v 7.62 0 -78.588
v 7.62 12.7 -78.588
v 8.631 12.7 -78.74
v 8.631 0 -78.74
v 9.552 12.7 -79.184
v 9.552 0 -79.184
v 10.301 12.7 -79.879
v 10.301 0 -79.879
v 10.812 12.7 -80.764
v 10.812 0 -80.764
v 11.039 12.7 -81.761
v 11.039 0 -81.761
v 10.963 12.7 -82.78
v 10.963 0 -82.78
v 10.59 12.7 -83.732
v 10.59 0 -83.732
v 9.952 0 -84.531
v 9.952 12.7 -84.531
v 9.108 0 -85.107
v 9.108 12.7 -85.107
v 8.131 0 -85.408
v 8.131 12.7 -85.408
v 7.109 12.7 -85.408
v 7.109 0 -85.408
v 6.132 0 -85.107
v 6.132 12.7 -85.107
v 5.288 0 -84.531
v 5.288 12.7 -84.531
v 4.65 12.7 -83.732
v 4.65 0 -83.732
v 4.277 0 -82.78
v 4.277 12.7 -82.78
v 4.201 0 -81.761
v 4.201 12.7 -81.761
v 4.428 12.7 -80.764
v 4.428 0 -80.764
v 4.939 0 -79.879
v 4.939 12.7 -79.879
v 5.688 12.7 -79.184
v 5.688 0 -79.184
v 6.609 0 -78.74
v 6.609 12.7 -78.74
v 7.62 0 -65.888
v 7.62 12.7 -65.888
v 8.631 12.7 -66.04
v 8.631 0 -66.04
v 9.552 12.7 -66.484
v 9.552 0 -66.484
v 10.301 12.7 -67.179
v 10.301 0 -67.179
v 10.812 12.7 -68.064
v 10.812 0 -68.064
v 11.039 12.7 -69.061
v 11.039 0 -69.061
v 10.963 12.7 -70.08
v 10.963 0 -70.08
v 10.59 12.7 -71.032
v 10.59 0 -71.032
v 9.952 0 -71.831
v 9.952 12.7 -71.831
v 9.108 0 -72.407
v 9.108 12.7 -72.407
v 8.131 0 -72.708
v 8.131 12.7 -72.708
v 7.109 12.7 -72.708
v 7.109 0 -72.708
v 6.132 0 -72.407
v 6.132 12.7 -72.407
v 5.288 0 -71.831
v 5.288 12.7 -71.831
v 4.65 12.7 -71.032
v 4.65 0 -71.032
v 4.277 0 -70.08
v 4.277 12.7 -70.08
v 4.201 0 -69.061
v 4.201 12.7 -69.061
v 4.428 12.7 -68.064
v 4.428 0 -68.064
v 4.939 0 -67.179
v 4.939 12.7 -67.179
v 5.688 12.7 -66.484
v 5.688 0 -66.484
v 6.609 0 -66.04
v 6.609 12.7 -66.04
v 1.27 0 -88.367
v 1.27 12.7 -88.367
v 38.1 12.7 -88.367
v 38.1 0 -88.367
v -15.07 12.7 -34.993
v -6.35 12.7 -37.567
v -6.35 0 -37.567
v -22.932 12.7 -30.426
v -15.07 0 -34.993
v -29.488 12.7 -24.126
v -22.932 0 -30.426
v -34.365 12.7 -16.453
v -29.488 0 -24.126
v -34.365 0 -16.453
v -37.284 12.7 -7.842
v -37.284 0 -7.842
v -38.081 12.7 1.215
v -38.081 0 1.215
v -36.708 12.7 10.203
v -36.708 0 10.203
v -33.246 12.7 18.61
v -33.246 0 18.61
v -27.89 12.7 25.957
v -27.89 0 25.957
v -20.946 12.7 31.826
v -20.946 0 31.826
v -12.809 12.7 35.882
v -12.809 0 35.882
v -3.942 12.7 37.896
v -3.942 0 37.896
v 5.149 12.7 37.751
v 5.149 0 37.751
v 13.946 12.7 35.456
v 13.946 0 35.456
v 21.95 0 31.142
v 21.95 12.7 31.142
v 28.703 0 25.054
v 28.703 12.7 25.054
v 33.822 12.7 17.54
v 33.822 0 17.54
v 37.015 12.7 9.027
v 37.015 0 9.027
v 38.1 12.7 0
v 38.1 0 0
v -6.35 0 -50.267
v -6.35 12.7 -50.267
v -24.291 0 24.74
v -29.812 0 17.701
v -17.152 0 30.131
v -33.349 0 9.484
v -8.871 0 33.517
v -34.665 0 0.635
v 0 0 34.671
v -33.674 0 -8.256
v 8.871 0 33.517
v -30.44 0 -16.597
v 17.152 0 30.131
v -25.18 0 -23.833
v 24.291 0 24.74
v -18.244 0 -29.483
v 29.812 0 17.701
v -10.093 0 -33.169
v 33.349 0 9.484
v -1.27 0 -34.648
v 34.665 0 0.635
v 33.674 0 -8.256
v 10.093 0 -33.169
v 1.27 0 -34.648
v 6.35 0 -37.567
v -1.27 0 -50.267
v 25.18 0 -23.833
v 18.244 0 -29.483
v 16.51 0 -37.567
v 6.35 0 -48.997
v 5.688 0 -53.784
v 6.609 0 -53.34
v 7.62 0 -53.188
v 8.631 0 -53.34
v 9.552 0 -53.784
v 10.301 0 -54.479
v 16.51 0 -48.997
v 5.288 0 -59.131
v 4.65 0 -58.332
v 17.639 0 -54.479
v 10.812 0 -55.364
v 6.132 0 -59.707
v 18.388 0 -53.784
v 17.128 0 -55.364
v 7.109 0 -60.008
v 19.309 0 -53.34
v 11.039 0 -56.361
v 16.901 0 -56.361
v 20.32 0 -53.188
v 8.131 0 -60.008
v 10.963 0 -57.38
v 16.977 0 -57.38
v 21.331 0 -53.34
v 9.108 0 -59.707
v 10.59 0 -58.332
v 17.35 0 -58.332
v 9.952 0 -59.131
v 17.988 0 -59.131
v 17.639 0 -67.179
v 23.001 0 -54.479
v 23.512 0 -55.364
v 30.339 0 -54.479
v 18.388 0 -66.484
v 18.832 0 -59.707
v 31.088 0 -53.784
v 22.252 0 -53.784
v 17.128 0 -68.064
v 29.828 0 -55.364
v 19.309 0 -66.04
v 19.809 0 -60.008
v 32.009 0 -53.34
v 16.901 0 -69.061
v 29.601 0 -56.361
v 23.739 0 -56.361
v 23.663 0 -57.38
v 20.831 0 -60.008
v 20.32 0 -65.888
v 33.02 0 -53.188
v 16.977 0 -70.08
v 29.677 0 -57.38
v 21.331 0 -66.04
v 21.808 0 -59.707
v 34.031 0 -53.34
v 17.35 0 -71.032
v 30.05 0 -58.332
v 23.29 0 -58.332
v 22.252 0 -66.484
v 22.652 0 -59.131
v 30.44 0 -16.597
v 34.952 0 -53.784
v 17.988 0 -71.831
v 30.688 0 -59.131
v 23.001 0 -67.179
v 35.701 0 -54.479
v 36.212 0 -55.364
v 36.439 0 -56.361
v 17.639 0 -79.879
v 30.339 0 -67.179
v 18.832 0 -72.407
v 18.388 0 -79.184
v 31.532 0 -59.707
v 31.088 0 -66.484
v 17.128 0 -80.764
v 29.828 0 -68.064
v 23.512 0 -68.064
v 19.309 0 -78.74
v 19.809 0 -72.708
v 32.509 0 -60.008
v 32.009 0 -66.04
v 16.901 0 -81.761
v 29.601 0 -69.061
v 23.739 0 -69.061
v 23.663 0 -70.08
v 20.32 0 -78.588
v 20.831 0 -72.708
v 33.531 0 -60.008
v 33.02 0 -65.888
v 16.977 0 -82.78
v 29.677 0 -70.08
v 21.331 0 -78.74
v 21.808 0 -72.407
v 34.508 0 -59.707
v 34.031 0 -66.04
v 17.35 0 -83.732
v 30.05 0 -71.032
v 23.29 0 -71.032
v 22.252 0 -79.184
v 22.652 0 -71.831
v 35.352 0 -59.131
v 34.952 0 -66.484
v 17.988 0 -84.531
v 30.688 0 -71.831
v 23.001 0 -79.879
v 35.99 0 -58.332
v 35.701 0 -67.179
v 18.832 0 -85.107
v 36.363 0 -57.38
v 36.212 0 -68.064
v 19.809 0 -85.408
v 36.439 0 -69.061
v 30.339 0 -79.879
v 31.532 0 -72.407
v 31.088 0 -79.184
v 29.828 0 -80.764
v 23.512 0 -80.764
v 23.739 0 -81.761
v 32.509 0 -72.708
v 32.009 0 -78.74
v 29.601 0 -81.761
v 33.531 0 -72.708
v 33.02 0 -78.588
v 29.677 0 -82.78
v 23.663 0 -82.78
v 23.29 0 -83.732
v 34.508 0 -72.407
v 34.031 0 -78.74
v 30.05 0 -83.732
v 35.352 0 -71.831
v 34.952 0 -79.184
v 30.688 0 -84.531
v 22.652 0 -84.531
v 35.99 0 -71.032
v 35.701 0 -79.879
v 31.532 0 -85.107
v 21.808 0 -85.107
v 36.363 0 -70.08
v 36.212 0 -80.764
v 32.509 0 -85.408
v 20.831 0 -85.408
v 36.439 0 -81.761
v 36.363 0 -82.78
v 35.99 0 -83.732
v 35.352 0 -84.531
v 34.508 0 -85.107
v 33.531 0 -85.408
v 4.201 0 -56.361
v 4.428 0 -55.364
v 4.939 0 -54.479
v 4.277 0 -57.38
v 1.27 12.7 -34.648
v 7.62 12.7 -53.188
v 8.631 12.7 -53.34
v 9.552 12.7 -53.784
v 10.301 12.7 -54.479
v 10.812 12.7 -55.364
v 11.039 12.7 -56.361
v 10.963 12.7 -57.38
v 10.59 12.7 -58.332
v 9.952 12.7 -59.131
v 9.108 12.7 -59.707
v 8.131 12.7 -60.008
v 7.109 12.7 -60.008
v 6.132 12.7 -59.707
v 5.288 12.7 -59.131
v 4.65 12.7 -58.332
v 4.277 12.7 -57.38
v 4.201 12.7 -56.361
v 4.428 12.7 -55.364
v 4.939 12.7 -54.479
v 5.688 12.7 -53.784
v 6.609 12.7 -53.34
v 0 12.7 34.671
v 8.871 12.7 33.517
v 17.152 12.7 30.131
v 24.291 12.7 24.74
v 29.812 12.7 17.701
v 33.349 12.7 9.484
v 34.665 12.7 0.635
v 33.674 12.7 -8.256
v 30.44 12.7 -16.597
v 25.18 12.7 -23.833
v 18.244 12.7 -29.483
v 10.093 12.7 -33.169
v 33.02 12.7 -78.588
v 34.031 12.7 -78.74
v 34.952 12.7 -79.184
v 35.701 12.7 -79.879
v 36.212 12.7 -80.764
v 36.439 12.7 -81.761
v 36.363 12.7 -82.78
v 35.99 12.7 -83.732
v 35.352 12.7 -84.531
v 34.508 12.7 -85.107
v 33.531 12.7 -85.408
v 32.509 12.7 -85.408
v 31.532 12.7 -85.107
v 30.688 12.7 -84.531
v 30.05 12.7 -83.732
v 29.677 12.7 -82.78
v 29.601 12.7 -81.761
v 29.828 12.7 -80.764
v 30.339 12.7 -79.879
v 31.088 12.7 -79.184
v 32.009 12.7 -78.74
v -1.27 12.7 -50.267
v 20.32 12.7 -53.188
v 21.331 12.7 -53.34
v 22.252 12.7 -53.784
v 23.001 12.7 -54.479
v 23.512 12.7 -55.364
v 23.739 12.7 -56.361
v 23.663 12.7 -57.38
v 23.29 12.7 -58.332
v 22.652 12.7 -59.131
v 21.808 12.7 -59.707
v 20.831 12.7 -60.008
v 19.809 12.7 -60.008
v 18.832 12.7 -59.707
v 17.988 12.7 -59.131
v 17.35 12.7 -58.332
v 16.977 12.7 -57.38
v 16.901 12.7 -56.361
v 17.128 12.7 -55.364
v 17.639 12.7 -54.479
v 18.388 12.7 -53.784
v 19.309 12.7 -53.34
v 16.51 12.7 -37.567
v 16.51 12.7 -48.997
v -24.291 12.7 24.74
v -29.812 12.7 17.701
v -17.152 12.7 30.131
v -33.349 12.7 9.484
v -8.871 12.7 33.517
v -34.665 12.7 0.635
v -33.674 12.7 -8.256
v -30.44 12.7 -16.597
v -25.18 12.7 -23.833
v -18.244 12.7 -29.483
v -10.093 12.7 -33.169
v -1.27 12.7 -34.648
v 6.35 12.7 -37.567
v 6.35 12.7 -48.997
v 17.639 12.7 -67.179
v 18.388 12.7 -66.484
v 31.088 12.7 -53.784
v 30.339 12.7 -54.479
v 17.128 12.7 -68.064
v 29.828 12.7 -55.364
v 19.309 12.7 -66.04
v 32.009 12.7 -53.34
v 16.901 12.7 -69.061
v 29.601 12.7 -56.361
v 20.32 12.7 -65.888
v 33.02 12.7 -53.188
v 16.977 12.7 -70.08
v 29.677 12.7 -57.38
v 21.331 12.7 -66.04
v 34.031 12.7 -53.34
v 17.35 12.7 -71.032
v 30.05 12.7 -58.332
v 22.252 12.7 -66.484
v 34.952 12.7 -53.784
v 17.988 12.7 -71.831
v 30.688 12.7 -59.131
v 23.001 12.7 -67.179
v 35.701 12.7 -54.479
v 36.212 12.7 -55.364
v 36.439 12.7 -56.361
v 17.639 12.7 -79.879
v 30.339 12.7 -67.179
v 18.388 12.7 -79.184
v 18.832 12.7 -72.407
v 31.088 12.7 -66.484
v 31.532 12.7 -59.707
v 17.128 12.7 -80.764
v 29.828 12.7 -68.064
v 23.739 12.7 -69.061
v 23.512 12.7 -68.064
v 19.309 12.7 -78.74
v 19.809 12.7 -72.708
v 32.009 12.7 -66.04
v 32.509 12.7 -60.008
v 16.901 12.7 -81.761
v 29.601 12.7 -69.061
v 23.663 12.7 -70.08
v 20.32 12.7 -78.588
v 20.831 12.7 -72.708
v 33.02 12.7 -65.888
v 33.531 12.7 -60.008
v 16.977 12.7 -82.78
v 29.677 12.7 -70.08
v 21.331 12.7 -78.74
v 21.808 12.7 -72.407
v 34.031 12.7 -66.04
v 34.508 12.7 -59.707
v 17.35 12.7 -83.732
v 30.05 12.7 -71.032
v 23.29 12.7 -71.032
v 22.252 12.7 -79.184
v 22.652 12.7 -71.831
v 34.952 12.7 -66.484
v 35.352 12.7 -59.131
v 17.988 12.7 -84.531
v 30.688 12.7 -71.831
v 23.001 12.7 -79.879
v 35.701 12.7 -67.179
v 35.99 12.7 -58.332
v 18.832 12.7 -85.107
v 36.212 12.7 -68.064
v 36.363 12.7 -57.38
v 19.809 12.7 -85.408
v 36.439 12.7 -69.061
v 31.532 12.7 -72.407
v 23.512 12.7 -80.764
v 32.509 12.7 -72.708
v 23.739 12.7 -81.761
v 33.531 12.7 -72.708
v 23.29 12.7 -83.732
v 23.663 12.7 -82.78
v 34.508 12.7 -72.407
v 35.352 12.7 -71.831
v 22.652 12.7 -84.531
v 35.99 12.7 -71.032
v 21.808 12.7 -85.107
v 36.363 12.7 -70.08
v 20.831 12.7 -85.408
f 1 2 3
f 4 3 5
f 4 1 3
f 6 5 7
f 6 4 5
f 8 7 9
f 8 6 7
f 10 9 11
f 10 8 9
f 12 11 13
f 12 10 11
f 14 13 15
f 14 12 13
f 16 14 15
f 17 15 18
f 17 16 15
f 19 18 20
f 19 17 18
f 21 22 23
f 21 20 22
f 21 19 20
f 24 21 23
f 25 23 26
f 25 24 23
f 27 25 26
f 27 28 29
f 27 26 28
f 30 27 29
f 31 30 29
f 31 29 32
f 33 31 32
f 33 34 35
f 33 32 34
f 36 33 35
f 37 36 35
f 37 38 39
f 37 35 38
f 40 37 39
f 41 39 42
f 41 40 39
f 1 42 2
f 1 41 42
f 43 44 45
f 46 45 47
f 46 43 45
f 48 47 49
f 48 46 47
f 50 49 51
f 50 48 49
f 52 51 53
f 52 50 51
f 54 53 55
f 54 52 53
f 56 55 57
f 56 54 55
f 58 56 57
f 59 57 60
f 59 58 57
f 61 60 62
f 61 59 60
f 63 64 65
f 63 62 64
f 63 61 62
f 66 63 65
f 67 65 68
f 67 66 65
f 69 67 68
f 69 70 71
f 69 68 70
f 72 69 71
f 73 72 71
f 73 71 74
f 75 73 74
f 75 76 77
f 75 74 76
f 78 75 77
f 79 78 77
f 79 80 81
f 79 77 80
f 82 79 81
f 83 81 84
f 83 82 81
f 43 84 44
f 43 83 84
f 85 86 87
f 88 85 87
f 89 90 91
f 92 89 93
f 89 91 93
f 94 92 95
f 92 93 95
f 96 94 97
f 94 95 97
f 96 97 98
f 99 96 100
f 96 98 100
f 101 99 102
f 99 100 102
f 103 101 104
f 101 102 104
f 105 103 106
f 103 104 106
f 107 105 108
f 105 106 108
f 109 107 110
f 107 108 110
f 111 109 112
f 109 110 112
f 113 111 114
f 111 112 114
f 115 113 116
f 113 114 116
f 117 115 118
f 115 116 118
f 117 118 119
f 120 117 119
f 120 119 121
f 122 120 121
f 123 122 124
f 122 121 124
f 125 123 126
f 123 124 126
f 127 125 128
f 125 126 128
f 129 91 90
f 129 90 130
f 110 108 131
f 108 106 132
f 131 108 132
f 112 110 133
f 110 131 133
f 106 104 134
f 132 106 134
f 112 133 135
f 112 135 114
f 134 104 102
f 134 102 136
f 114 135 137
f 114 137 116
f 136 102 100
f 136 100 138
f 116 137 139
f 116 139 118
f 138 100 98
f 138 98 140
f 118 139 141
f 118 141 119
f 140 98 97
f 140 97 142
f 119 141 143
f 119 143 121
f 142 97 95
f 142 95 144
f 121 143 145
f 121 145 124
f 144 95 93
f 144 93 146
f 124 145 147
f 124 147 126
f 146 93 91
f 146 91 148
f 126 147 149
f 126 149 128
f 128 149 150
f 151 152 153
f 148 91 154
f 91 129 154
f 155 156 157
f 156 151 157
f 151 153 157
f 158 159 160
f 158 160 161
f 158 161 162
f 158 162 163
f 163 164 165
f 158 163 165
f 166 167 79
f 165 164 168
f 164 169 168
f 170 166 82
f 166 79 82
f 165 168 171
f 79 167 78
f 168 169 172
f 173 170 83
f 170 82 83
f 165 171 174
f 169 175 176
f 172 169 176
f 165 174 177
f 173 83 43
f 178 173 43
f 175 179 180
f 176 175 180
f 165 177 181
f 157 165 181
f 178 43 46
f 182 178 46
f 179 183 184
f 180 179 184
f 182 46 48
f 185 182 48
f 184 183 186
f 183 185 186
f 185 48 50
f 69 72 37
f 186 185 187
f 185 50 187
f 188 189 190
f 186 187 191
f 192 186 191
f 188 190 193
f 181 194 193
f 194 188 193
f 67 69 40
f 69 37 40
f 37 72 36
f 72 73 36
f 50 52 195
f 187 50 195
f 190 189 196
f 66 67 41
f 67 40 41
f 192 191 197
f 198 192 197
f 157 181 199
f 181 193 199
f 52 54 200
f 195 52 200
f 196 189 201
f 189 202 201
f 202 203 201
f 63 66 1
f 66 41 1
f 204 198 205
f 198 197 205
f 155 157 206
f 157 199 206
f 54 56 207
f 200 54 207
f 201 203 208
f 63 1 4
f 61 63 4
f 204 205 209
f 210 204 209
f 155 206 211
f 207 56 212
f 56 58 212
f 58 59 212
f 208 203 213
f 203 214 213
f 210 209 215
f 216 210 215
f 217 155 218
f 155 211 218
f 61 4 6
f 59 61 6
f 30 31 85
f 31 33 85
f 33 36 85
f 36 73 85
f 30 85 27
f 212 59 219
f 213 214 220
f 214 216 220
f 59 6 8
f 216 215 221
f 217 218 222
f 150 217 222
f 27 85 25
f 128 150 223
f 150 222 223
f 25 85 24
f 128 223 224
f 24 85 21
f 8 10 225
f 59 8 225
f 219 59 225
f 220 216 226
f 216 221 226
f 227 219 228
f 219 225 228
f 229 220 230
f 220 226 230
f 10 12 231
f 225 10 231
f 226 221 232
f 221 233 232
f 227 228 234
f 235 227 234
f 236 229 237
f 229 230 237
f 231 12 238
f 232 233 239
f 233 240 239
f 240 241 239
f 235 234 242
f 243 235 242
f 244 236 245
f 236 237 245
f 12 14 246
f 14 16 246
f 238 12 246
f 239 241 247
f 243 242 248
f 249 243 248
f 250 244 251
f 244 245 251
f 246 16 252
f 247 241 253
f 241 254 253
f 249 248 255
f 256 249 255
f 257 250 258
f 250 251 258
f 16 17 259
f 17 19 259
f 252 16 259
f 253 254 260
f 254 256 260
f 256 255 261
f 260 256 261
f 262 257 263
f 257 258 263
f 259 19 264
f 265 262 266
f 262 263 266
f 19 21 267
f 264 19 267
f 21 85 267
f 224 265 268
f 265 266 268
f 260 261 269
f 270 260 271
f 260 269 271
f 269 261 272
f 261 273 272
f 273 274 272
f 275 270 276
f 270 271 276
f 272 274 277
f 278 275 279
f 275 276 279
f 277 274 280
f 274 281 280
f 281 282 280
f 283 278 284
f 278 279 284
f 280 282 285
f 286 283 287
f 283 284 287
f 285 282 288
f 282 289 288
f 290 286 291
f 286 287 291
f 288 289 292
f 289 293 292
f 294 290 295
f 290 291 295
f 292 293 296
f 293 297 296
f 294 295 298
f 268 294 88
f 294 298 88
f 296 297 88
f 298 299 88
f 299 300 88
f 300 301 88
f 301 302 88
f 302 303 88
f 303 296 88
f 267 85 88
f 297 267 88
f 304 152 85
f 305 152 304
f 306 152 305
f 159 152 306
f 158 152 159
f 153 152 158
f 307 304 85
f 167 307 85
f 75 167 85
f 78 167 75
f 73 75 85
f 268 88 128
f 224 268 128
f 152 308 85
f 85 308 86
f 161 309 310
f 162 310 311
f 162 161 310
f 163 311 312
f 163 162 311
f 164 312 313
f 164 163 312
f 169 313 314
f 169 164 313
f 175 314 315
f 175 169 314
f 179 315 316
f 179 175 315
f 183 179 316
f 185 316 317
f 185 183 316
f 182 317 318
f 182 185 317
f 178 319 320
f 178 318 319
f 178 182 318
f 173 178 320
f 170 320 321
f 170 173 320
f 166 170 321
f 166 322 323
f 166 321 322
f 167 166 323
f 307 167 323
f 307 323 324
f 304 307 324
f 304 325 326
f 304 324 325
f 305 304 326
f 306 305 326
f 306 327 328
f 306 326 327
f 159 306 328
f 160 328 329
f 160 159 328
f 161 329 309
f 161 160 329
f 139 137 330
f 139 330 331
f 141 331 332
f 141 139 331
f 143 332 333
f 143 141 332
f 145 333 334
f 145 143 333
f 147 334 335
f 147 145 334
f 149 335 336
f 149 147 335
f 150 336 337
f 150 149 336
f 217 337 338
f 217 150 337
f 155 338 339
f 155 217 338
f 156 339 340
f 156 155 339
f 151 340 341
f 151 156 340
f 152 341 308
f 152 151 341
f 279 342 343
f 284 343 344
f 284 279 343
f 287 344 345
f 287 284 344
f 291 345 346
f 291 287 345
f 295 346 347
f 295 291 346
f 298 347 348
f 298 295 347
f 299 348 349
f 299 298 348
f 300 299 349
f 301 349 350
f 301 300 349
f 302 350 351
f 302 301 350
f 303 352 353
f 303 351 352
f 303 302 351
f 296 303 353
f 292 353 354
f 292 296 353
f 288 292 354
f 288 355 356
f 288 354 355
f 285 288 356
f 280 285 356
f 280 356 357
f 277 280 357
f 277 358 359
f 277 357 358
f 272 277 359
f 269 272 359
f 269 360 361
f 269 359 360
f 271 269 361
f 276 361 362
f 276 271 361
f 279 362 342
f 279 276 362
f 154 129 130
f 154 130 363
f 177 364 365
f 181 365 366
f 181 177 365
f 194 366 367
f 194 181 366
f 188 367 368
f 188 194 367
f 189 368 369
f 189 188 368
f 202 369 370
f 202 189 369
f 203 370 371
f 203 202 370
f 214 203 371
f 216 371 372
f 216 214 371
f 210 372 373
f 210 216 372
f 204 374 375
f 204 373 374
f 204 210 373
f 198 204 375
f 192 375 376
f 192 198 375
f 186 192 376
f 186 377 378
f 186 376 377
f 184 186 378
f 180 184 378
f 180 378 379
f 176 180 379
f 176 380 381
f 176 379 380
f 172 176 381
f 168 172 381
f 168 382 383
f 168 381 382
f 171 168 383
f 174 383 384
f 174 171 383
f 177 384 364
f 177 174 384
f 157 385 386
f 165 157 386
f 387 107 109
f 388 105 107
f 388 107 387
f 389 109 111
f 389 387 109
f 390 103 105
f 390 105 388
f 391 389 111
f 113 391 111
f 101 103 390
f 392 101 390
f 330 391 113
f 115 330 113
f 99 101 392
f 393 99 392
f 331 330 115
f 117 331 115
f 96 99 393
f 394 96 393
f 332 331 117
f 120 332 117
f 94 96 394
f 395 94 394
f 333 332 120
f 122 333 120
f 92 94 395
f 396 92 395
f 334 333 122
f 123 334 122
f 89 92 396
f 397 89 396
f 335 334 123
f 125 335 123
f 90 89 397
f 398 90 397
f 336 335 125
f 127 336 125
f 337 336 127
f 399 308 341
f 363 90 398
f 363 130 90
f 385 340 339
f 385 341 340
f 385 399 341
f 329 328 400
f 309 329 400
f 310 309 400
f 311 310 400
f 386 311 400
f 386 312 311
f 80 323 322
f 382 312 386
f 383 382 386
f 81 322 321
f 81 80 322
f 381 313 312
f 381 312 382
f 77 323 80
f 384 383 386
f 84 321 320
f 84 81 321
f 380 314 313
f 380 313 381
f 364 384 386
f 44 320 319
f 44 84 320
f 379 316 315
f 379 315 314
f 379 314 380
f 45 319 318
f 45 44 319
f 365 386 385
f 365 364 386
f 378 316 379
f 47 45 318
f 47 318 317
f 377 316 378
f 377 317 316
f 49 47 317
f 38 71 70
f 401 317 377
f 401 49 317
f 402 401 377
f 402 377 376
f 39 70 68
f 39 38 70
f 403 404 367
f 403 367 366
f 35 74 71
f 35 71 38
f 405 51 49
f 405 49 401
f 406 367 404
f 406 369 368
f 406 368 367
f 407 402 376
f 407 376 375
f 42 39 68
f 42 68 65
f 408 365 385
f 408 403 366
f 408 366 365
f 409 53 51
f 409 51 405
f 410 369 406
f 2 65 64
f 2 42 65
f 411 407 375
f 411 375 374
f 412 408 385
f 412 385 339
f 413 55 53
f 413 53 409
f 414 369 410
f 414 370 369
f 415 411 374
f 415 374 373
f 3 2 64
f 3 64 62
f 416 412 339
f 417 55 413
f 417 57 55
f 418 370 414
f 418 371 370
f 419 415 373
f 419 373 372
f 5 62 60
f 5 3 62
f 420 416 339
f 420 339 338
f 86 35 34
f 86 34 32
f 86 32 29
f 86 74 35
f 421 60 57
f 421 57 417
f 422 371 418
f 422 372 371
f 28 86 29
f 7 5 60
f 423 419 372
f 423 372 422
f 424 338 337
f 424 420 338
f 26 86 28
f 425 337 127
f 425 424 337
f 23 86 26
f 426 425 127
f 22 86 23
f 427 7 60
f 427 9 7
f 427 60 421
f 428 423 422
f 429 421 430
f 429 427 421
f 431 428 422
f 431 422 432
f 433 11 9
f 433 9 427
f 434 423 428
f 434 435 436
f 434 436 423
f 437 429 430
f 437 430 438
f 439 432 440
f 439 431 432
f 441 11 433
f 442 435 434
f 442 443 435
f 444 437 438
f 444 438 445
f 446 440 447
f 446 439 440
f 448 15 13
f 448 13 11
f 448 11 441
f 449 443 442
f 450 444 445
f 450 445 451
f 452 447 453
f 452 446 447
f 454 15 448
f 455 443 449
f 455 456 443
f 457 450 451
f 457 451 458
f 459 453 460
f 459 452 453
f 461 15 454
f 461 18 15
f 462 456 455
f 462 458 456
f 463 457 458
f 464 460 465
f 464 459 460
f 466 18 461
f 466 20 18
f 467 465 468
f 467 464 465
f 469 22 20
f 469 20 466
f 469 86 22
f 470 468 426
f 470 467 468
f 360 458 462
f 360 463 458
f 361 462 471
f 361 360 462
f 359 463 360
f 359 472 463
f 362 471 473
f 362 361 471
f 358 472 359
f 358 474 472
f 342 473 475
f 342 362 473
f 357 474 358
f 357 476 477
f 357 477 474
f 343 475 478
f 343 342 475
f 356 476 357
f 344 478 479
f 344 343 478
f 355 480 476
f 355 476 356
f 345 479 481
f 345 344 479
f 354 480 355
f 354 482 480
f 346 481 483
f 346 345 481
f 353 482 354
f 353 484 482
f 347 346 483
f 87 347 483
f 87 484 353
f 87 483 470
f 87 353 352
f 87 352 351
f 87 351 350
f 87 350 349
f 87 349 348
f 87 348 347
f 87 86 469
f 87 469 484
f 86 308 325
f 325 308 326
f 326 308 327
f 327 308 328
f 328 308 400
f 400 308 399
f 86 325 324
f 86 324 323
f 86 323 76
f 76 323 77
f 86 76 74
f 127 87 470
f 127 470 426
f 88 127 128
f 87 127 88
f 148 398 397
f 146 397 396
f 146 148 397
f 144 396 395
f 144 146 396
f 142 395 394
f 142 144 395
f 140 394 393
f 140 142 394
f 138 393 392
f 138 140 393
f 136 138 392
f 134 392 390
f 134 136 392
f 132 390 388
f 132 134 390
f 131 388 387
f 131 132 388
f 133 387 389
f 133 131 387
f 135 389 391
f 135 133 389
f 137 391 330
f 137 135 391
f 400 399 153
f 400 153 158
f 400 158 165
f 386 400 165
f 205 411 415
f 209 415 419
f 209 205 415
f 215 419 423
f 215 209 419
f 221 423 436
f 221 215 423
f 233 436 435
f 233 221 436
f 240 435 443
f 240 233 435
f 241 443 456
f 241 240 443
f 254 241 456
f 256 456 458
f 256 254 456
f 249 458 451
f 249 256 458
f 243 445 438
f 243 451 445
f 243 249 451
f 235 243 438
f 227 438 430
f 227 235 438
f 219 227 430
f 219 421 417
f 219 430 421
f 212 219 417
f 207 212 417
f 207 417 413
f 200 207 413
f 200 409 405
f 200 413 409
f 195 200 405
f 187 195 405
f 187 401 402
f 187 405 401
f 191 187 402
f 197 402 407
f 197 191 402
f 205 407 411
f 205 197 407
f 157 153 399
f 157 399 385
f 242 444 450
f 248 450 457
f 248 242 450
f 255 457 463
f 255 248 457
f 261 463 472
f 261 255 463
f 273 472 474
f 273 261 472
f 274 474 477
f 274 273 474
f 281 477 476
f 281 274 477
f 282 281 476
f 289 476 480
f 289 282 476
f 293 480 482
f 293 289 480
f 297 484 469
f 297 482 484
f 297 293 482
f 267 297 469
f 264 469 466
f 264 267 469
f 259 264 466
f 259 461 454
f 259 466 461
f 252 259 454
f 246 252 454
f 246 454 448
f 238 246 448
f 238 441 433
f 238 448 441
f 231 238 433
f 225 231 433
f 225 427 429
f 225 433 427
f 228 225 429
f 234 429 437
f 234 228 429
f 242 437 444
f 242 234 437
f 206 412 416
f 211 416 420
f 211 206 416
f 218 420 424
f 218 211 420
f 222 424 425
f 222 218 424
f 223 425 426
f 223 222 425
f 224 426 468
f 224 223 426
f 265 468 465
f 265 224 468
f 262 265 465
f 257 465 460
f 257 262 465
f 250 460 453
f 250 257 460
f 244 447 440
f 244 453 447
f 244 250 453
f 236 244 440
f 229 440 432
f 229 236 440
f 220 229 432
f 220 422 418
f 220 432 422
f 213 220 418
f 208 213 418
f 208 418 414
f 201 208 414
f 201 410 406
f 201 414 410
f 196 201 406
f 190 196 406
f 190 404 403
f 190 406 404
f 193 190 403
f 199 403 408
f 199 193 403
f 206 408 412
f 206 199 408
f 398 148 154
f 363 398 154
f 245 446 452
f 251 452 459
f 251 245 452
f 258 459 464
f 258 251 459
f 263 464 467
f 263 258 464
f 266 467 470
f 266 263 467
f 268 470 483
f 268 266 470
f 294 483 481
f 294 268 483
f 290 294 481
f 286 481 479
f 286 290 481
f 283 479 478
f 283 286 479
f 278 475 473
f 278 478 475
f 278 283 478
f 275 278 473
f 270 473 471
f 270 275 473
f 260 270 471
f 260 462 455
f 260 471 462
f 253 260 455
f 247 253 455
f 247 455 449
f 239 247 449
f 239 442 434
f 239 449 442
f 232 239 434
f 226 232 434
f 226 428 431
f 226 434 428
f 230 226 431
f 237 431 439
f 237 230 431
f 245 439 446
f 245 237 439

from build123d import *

# Parameters (mm, degrees)
SKETCH1_R           = 38.1
SKETCH1_R_2         = 34.671
BOSS_EXTRUDE1_DEPTH = 12.7
SKETCH2_W           = 12.7
SKETCH2_H           = 12.7
BOSS_EXTRUDE2_DEPTH = 12.7
SKETCH4_W           = 2.54
SKETCH4_H           = 58.988343485
CUT_EXTRUDE2_DEPTH  = 65.340360647
BOSS_EXTRUDE3_REACH = 104.44
BOSS_EXTRUDE3_START = 38.1
SKETCH5_W           = 50.267106623
SKETCH5_H           = 12.7
SKETCH6_W           = 36.83
SKETCH6_H           = 50.8
BOSS_EXTRUDE4_DEPTH = 12.7
SKETCH7_R           = 3.429
SKETCH7_W           = 10.16
SKETCH7_H           = 11.43
CUT_EXTRUDE3_DEPTH  = 109.754126547
SKETCH8_W           = 36.83
SKETCH8_H           = 12.7
CUT_EXTRUDE4_DEPTH  = 109.754126547


with BuildPart() as part:
    # Sketch1 → Boss-Extrude1 (new body)
    with BuildSketch(Plane(origin=(0, 0, 0), x_dir=(1, 0, 0), z_dir=(0, 1, 0))):
        with Locations(Location((0, 0, 0), (0, 0, 270))):
            Circle(SKETCH1_R)
        with Locations(Location((0, 0, 0), (0, 0, 270))):
            Circle(SKETCH1_R_2, mode=Mode.SUBTRACT)
    extrude(amount=BOSS_EXTRUDE1_DEPTH)

    # Sketch2 → Boss-Extrude2 (add)
    with BuildSketch(Plane(origin=(0, 0, 0), x_dir=(1, 0, 0), z_dir=(0, 1, 0))):
        with Locations((0, 43.917106623)):
            Rectangle(SKETCH2_W, SKETCH2_H)
    extrude(amount=BOSS_EXTRUDE2_DEPTH)

    # Sketch4 → Cut-Extrude2 (cut, through all)
    with BuildSketch(Plane(origin=(0, 0, 0), x_dir=(1, 0, 0), z_dir=(0, 1, 0))):
        with Locations((0, 30.925816426)):
            Rectangle(SKETCH4_W, SKETCH4_H)
    extrude(amount=CUT_EXTRUDE2_DEPTH, mode=Mode.SUBTRACT)

    # Sketch5 → Boss-Extrude3 (add, up to next)
    with BuildSketch(Plane(origin=(0, 0, 0), x_dir=(0, 0, -1), z_dir=(1, 0, 0)).offset(BOSS_EXTRUDE3_START), mode=Mode.PRIVATE) as boss_extrude3_sk1:
        with Locations((25.133553312, 6.35)):
            Rectangle(SKETCH5_W, SKETCH5_H)
    boss_extrude3_tool1 = extrude(boss_extrude3_sk1.sketch, amount=-BOSS_EXTRUDE3_REACH, mode=Mode.PRIVATE) - part.part
    add(boss_extrude3_tool1.solids().sort_by_distance((38.1, 6.35, -25.133553))[0])

    # Sketch6 → Boss-Extrude4 (add)
    with BuildSketch(Plane(origin=(0, 12.7, 0), x_dir=(1, 0, 0), z_dir=(0, 1, 0))):
        with Locations((19.685, 75.667106623)):
            Rectangle(SKETCH6_W, SKETCH6_H)
    extrude(amount=-BOSS_EXTRUDE4_DEPTH)

    # Sketch7 → Cut-Extrude3 (cut, through all)
    with BuildSketch(Plane(origin=(0, 0, 0), x_dir=(1, 0, 0), z_dir=(0, 1, 0))):
        with Locations(Location((7.62, 94.717106623, 0), (0, 0, 270))):
            Circle(SKETCH7_R)
        with Locations(Location((20.32, 94.717106623, 0), (0, 0, 270))):
            Circle(SKETCH7_R)
        with Locations(Location((20.32, 82.017106623, 0), (0, 0, 270))):
            Circle(SKETCH7_R)
        with Locations(Location((7.62, 82.017106623, 0), (0, 0, 270))):
            Circle(SKETCH7_R)
        with Locations(Location((7.62, 69.317106623, 0), (0, 0, 270))):
            Circle(SKETCH7_R)
        with Locations(Location((20.32, 69.317106623, 0), (0, 0, 270))):
            Circle(SKETCH7_R)
        with Locations(Location((7.62, 56.617106623, 0), (0, 0, 270))):
            Circle(SKETCH7_R)
        with Locations(Location((20.32, 56.617106623, 0), (0, 0, 270))):
            Circle(SKETCH7_R)
        with Locations(Location((33.02, 94.717106623, 0), (0, 0, 270))):
            Circle(SKETCH7_R)
        with Locations(Location((33.02, 82.017106623, 0), (0, 0, 270))):
            Circle(SKETCH7_R)
        with Locations(Location((33.02, 69.317106623, 0), (0, 0, 270))):
            Circle(SKETCH7_R)
        with Locations(Location((33.02, 56.617106623, 0), (0, 0, 270))):
            Circle(SKETCH7_R)
        with Locations((11.43, 43.282106623)):
            Rectangle(SKETCH7_W, SKETCH7_H)
    extrude(amount=CUT_EXTRUDE3_DEPTH, mode=Mode.SUBTRACT)

    # Sketch8 → Cut-Extrude4 (cut, through all)
    with BuildSketch(Plane(origin=(0, 12.7, 0), x_dir=(1, 0, 0), z_dir=(0, 1, 0))):
        with Locations((19.685, 94.717106623)):
            Rectangle(SKETCH8_W, SKETCH8_H)
    extrude(amount=-CUT_EXTRUDE4_DEPTH, mode=Mode.SUBTRACT)


solid = part.part
